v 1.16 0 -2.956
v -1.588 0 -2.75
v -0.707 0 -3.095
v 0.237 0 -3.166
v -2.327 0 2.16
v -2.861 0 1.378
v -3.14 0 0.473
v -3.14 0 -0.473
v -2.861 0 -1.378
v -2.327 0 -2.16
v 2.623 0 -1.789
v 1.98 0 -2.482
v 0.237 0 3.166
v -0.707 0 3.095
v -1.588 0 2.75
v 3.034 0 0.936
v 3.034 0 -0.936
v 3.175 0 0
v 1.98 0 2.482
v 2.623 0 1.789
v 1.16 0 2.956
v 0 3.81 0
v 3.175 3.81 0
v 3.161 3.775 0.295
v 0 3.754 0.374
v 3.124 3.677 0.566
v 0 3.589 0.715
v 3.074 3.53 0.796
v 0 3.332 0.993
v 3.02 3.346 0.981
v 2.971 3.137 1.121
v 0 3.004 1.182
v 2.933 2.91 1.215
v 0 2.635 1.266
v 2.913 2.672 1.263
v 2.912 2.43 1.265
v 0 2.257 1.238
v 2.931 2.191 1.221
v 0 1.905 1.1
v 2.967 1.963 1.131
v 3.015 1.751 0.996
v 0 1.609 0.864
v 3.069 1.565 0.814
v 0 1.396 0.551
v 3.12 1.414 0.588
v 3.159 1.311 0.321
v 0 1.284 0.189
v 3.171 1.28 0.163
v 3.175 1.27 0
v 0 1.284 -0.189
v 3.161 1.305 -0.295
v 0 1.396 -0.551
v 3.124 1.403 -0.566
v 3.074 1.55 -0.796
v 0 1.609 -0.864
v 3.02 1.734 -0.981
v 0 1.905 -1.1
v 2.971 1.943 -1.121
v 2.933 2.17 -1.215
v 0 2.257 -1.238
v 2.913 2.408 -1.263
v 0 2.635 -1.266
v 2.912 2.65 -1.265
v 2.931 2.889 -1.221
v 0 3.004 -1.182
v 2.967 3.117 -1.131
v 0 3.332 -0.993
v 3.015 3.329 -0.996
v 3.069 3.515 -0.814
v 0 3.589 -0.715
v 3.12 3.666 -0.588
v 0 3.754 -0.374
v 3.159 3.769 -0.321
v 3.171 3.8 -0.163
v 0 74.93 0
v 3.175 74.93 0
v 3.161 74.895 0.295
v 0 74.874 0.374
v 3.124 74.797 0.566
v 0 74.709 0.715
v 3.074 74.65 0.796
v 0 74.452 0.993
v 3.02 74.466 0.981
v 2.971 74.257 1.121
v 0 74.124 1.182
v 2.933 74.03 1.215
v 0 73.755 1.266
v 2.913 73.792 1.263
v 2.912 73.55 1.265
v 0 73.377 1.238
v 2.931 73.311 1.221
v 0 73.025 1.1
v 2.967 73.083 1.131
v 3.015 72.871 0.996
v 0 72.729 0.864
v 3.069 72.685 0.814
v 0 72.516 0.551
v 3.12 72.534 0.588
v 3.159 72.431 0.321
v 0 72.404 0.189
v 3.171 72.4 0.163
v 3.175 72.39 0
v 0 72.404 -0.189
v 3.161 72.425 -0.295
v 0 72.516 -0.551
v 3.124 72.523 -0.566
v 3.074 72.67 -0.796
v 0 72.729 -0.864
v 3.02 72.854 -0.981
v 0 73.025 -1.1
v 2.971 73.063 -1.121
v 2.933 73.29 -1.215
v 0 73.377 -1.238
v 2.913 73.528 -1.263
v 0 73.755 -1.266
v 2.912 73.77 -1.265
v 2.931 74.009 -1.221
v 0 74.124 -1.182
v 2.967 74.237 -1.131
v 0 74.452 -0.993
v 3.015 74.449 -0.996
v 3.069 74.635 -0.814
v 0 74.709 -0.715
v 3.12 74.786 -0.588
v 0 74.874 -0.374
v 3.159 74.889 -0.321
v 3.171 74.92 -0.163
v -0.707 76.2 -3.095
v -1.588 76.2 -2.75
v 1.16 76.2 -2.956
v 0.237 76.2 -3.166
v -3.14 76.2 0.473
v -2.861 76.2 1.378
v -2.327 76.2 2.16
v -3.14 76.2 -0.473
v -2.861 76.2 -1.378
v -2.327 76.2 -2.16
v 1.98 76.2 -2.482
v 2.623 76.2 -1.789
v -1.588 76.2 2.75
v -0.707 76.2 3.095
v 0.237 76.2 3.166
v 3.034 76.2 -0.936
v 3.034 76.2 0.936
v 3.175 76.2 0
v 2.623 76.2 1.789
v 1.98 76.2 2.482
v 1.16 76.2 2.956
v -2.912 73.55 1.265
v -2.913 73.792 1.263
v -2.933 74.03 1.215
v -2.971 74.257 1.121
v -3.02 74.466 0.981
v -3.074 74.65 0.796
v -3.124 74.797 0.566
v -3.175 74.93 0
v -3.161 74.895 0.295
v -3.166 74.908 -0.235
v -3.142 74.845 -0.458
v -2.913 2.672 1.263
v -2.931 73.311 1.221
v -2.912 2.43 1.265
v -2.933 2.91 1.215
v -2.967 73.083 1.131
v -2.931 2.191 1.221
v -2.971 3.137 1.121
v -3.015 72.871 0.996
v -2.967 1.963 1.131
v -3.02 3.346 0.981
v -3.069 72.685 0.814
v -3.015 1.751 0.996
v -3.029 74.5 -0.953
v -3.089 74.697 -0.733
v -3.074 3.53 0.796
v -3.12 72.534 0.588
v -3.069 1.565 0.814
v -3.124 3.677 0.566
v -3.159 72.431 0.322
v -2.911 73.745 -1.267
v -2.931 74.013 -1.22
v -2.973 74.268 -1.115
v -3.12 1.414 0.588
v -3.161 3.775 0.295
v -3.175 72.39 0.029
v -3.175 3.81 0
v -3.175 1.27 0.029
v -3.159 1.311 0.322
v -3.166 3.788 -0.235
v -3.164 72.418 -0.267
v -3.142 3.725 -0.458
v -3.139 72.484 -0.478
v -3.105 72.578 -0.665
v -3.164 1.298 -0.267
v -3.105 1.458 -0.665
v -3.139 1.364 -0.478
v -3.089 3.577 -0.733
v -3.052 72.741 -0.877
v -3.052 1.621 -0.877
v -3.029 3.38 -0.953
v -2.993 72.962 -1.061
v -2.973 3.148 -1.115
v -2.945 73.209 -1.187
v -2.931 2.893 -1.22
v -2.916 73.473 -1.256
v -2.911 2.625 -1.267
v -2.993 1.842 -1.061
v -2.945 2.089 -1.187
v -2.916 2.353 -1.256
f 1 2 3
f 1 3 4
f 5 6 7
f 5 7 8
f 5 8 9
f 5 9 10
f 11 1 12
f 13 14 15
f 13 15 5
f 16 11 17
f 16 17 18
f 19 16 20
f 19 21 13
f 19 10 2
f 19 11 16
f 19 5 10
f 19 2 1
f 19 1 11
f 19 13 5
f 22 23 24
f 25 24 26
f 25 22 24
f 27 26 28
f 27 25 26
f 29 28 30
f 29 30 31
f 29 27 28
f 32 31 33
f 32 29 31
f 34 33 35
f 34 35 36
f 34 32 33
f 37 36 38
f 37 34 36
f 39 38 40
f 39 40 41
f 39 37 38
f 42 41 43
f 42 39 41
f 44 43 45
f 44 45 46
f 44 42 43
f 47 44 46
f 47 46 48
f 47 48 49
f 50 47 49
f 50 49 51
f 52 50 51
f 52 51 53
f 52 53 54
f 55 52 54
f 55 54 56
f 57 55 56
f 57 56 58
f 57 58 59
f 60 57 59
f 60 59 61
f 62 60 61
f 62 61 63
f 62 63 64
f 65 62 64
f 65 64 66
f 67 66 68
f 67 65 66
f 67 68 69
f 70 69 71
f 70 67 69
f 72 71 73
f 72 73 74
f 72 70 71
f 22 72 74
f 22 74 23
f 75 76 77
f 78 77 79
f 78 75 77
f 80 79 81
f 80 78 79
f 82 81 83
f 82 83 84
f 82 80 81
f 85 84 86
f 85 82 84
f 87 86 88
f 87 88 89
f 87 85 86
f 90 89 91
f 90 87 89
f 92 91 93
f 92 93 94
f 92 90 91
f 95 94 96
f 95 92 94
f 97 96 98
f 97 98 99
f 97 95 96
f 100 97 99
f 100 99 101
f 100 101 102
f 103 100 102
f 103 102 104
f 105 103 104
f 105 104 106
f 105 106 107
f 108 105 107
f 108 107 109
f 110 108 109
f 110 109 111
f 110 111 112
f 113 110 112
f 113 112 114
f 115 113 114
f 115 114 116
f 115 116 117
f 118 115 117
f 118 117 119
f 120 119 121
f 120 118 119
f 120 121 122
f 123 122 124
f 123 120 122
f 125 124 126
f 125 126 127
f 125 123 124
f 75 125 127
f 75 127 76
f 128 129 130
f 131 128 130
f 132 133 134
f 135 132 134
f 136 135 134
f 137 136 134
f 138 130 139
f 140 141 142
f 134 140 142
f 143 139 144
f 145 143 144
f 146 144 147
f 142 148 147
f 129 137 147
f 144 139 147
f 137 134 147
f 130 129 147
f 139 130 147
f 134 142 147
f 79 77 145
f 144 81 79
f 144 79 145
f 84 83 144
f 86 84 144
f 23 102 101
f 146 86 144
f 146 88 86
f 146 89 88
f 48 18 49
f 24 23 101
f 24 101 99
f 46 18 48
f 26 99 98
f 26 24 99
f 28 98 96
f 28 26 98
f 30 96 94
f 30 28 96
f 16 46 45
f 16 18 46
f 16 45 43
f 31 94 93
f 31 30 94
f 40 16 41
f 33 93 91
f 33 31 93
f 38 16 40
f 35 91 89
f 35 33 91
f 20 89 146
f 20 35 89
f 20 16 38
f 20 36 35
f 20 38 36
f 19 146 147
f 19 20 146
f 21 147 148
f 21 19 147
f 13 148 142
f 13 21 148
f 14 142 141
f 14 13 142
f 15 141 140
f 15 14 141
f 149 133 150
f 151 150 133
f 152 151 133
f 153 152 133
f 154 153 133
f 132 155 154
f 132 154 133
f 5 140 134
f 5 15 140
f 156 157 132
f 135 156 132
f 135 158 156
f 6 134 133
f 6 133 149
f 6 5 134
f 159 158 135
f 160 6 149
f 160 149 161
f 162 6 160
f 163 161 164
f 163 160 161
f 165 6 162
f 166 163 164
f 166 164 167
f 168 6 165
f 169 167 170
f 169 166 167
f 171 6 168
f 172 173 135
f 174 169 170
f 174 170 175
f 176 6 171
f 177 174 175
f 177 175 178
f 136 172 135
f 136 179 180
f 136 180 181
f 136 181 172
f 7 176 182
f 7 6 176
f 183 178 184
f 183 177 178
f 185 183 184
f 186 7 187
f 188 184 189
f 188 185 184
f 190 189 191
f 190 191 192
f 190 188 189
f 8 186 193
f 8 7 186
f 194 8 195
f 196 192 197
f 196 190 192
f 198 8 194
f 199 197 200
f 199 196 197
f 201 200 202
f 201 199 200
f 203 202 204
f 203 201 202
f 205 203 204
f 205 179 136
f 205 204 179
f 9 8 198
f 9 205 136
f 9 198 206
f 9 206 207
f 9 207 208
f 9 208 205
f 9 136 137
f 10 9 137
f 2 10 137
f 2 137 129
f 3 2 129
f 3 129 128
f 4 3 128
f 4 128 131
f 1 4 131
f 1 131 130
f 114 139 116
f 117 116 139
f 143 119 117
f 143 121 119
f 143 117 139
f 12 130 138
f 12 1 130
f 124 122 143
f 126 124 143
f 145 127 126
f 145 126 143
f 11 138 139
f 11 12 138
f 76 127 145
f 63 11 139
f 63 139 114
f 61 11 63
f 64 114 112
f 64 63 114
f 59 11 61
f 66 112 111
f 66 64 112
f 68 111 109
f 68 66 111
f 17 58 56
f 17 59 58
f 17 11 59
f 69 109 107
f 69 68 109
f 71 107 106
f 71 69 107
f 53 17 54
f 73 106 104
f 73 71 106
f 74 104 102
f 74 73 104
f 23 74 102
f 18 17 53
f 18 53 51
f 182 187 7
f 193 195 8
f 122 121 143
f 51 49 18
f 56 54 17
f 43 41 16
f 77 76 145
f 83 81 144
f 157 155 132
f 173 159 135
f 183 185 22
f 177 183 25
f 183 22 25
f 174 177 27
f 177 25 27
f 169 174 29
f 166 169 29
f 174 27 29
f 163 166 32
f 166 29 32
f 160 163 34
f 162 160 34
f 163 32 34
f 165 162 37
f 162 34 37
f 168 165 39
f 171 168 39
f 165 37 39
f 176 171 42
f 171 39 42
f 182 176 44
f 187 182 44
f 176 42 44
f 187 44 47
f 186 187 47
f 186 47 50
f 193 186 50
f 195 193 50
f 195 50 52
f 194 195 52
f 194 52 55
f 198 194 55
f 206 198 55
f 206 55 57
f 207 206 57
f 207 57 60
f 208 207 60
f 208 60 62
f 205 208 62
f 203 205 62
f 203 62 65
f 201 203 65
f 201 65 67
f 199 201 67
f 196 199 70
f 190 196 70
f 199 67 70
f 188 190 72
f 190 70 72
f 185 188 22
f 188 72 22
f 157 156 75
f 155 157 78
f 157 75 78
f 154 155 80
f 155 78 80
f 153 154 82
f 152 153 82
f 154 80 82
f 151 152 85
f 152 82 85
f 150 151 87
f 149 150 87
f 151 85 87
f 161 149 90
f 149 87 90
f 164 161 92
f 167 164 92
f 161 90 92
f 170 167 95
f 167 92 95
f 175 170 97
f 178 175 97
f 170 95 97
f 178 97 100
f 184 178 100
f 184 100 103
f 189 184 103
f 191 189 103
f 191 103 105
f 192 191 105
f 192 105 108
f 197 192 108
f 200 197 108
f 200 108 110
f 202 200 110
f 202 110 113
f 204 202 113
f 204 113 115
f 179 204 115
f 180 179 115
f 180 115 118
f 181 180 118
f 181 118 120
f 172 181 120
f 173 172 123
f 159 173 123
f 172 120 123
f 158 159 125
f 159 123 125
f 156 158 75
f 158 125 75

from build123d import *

# Parameters (mm, degrees)
F0_R     = 3.175
F1_DEPTH = 76.2
F2_R     = 1.27
F3_DEPTH = 3.176
F4_DEPTH = 3.176


with BuildPart() as f1:
    # F0 (on Front) → F1 (new body)
    with BuildSketch(Plane.XZ):
        Circle(F0_R)
    extrude(amount=-F1_DEPTH)

    # F2 (on Right) → F3 (cut, through all)
    with BuildSketch(Plane.YZ):
        with Locations((2.54, 0)):
            Circle(F2_R)
        with Locations((73.66, 0)):
            Circle(F2_R)
    extrude(amount=F3_DEPTH, mode=Mode.SUBTRACT)

    # F2 (on Right) → F4 (cut, through all)
    with BuildSketch(Plane.YZ):
        with Locations((2.54, 0)):
            Circle(F2_R)
        with Locations((73.66, 0)):
            Circle(F2_R)
    extrude(amount=-F4_DEPTH, mode=Mode.SUBTRACT)


solid = f1.part
